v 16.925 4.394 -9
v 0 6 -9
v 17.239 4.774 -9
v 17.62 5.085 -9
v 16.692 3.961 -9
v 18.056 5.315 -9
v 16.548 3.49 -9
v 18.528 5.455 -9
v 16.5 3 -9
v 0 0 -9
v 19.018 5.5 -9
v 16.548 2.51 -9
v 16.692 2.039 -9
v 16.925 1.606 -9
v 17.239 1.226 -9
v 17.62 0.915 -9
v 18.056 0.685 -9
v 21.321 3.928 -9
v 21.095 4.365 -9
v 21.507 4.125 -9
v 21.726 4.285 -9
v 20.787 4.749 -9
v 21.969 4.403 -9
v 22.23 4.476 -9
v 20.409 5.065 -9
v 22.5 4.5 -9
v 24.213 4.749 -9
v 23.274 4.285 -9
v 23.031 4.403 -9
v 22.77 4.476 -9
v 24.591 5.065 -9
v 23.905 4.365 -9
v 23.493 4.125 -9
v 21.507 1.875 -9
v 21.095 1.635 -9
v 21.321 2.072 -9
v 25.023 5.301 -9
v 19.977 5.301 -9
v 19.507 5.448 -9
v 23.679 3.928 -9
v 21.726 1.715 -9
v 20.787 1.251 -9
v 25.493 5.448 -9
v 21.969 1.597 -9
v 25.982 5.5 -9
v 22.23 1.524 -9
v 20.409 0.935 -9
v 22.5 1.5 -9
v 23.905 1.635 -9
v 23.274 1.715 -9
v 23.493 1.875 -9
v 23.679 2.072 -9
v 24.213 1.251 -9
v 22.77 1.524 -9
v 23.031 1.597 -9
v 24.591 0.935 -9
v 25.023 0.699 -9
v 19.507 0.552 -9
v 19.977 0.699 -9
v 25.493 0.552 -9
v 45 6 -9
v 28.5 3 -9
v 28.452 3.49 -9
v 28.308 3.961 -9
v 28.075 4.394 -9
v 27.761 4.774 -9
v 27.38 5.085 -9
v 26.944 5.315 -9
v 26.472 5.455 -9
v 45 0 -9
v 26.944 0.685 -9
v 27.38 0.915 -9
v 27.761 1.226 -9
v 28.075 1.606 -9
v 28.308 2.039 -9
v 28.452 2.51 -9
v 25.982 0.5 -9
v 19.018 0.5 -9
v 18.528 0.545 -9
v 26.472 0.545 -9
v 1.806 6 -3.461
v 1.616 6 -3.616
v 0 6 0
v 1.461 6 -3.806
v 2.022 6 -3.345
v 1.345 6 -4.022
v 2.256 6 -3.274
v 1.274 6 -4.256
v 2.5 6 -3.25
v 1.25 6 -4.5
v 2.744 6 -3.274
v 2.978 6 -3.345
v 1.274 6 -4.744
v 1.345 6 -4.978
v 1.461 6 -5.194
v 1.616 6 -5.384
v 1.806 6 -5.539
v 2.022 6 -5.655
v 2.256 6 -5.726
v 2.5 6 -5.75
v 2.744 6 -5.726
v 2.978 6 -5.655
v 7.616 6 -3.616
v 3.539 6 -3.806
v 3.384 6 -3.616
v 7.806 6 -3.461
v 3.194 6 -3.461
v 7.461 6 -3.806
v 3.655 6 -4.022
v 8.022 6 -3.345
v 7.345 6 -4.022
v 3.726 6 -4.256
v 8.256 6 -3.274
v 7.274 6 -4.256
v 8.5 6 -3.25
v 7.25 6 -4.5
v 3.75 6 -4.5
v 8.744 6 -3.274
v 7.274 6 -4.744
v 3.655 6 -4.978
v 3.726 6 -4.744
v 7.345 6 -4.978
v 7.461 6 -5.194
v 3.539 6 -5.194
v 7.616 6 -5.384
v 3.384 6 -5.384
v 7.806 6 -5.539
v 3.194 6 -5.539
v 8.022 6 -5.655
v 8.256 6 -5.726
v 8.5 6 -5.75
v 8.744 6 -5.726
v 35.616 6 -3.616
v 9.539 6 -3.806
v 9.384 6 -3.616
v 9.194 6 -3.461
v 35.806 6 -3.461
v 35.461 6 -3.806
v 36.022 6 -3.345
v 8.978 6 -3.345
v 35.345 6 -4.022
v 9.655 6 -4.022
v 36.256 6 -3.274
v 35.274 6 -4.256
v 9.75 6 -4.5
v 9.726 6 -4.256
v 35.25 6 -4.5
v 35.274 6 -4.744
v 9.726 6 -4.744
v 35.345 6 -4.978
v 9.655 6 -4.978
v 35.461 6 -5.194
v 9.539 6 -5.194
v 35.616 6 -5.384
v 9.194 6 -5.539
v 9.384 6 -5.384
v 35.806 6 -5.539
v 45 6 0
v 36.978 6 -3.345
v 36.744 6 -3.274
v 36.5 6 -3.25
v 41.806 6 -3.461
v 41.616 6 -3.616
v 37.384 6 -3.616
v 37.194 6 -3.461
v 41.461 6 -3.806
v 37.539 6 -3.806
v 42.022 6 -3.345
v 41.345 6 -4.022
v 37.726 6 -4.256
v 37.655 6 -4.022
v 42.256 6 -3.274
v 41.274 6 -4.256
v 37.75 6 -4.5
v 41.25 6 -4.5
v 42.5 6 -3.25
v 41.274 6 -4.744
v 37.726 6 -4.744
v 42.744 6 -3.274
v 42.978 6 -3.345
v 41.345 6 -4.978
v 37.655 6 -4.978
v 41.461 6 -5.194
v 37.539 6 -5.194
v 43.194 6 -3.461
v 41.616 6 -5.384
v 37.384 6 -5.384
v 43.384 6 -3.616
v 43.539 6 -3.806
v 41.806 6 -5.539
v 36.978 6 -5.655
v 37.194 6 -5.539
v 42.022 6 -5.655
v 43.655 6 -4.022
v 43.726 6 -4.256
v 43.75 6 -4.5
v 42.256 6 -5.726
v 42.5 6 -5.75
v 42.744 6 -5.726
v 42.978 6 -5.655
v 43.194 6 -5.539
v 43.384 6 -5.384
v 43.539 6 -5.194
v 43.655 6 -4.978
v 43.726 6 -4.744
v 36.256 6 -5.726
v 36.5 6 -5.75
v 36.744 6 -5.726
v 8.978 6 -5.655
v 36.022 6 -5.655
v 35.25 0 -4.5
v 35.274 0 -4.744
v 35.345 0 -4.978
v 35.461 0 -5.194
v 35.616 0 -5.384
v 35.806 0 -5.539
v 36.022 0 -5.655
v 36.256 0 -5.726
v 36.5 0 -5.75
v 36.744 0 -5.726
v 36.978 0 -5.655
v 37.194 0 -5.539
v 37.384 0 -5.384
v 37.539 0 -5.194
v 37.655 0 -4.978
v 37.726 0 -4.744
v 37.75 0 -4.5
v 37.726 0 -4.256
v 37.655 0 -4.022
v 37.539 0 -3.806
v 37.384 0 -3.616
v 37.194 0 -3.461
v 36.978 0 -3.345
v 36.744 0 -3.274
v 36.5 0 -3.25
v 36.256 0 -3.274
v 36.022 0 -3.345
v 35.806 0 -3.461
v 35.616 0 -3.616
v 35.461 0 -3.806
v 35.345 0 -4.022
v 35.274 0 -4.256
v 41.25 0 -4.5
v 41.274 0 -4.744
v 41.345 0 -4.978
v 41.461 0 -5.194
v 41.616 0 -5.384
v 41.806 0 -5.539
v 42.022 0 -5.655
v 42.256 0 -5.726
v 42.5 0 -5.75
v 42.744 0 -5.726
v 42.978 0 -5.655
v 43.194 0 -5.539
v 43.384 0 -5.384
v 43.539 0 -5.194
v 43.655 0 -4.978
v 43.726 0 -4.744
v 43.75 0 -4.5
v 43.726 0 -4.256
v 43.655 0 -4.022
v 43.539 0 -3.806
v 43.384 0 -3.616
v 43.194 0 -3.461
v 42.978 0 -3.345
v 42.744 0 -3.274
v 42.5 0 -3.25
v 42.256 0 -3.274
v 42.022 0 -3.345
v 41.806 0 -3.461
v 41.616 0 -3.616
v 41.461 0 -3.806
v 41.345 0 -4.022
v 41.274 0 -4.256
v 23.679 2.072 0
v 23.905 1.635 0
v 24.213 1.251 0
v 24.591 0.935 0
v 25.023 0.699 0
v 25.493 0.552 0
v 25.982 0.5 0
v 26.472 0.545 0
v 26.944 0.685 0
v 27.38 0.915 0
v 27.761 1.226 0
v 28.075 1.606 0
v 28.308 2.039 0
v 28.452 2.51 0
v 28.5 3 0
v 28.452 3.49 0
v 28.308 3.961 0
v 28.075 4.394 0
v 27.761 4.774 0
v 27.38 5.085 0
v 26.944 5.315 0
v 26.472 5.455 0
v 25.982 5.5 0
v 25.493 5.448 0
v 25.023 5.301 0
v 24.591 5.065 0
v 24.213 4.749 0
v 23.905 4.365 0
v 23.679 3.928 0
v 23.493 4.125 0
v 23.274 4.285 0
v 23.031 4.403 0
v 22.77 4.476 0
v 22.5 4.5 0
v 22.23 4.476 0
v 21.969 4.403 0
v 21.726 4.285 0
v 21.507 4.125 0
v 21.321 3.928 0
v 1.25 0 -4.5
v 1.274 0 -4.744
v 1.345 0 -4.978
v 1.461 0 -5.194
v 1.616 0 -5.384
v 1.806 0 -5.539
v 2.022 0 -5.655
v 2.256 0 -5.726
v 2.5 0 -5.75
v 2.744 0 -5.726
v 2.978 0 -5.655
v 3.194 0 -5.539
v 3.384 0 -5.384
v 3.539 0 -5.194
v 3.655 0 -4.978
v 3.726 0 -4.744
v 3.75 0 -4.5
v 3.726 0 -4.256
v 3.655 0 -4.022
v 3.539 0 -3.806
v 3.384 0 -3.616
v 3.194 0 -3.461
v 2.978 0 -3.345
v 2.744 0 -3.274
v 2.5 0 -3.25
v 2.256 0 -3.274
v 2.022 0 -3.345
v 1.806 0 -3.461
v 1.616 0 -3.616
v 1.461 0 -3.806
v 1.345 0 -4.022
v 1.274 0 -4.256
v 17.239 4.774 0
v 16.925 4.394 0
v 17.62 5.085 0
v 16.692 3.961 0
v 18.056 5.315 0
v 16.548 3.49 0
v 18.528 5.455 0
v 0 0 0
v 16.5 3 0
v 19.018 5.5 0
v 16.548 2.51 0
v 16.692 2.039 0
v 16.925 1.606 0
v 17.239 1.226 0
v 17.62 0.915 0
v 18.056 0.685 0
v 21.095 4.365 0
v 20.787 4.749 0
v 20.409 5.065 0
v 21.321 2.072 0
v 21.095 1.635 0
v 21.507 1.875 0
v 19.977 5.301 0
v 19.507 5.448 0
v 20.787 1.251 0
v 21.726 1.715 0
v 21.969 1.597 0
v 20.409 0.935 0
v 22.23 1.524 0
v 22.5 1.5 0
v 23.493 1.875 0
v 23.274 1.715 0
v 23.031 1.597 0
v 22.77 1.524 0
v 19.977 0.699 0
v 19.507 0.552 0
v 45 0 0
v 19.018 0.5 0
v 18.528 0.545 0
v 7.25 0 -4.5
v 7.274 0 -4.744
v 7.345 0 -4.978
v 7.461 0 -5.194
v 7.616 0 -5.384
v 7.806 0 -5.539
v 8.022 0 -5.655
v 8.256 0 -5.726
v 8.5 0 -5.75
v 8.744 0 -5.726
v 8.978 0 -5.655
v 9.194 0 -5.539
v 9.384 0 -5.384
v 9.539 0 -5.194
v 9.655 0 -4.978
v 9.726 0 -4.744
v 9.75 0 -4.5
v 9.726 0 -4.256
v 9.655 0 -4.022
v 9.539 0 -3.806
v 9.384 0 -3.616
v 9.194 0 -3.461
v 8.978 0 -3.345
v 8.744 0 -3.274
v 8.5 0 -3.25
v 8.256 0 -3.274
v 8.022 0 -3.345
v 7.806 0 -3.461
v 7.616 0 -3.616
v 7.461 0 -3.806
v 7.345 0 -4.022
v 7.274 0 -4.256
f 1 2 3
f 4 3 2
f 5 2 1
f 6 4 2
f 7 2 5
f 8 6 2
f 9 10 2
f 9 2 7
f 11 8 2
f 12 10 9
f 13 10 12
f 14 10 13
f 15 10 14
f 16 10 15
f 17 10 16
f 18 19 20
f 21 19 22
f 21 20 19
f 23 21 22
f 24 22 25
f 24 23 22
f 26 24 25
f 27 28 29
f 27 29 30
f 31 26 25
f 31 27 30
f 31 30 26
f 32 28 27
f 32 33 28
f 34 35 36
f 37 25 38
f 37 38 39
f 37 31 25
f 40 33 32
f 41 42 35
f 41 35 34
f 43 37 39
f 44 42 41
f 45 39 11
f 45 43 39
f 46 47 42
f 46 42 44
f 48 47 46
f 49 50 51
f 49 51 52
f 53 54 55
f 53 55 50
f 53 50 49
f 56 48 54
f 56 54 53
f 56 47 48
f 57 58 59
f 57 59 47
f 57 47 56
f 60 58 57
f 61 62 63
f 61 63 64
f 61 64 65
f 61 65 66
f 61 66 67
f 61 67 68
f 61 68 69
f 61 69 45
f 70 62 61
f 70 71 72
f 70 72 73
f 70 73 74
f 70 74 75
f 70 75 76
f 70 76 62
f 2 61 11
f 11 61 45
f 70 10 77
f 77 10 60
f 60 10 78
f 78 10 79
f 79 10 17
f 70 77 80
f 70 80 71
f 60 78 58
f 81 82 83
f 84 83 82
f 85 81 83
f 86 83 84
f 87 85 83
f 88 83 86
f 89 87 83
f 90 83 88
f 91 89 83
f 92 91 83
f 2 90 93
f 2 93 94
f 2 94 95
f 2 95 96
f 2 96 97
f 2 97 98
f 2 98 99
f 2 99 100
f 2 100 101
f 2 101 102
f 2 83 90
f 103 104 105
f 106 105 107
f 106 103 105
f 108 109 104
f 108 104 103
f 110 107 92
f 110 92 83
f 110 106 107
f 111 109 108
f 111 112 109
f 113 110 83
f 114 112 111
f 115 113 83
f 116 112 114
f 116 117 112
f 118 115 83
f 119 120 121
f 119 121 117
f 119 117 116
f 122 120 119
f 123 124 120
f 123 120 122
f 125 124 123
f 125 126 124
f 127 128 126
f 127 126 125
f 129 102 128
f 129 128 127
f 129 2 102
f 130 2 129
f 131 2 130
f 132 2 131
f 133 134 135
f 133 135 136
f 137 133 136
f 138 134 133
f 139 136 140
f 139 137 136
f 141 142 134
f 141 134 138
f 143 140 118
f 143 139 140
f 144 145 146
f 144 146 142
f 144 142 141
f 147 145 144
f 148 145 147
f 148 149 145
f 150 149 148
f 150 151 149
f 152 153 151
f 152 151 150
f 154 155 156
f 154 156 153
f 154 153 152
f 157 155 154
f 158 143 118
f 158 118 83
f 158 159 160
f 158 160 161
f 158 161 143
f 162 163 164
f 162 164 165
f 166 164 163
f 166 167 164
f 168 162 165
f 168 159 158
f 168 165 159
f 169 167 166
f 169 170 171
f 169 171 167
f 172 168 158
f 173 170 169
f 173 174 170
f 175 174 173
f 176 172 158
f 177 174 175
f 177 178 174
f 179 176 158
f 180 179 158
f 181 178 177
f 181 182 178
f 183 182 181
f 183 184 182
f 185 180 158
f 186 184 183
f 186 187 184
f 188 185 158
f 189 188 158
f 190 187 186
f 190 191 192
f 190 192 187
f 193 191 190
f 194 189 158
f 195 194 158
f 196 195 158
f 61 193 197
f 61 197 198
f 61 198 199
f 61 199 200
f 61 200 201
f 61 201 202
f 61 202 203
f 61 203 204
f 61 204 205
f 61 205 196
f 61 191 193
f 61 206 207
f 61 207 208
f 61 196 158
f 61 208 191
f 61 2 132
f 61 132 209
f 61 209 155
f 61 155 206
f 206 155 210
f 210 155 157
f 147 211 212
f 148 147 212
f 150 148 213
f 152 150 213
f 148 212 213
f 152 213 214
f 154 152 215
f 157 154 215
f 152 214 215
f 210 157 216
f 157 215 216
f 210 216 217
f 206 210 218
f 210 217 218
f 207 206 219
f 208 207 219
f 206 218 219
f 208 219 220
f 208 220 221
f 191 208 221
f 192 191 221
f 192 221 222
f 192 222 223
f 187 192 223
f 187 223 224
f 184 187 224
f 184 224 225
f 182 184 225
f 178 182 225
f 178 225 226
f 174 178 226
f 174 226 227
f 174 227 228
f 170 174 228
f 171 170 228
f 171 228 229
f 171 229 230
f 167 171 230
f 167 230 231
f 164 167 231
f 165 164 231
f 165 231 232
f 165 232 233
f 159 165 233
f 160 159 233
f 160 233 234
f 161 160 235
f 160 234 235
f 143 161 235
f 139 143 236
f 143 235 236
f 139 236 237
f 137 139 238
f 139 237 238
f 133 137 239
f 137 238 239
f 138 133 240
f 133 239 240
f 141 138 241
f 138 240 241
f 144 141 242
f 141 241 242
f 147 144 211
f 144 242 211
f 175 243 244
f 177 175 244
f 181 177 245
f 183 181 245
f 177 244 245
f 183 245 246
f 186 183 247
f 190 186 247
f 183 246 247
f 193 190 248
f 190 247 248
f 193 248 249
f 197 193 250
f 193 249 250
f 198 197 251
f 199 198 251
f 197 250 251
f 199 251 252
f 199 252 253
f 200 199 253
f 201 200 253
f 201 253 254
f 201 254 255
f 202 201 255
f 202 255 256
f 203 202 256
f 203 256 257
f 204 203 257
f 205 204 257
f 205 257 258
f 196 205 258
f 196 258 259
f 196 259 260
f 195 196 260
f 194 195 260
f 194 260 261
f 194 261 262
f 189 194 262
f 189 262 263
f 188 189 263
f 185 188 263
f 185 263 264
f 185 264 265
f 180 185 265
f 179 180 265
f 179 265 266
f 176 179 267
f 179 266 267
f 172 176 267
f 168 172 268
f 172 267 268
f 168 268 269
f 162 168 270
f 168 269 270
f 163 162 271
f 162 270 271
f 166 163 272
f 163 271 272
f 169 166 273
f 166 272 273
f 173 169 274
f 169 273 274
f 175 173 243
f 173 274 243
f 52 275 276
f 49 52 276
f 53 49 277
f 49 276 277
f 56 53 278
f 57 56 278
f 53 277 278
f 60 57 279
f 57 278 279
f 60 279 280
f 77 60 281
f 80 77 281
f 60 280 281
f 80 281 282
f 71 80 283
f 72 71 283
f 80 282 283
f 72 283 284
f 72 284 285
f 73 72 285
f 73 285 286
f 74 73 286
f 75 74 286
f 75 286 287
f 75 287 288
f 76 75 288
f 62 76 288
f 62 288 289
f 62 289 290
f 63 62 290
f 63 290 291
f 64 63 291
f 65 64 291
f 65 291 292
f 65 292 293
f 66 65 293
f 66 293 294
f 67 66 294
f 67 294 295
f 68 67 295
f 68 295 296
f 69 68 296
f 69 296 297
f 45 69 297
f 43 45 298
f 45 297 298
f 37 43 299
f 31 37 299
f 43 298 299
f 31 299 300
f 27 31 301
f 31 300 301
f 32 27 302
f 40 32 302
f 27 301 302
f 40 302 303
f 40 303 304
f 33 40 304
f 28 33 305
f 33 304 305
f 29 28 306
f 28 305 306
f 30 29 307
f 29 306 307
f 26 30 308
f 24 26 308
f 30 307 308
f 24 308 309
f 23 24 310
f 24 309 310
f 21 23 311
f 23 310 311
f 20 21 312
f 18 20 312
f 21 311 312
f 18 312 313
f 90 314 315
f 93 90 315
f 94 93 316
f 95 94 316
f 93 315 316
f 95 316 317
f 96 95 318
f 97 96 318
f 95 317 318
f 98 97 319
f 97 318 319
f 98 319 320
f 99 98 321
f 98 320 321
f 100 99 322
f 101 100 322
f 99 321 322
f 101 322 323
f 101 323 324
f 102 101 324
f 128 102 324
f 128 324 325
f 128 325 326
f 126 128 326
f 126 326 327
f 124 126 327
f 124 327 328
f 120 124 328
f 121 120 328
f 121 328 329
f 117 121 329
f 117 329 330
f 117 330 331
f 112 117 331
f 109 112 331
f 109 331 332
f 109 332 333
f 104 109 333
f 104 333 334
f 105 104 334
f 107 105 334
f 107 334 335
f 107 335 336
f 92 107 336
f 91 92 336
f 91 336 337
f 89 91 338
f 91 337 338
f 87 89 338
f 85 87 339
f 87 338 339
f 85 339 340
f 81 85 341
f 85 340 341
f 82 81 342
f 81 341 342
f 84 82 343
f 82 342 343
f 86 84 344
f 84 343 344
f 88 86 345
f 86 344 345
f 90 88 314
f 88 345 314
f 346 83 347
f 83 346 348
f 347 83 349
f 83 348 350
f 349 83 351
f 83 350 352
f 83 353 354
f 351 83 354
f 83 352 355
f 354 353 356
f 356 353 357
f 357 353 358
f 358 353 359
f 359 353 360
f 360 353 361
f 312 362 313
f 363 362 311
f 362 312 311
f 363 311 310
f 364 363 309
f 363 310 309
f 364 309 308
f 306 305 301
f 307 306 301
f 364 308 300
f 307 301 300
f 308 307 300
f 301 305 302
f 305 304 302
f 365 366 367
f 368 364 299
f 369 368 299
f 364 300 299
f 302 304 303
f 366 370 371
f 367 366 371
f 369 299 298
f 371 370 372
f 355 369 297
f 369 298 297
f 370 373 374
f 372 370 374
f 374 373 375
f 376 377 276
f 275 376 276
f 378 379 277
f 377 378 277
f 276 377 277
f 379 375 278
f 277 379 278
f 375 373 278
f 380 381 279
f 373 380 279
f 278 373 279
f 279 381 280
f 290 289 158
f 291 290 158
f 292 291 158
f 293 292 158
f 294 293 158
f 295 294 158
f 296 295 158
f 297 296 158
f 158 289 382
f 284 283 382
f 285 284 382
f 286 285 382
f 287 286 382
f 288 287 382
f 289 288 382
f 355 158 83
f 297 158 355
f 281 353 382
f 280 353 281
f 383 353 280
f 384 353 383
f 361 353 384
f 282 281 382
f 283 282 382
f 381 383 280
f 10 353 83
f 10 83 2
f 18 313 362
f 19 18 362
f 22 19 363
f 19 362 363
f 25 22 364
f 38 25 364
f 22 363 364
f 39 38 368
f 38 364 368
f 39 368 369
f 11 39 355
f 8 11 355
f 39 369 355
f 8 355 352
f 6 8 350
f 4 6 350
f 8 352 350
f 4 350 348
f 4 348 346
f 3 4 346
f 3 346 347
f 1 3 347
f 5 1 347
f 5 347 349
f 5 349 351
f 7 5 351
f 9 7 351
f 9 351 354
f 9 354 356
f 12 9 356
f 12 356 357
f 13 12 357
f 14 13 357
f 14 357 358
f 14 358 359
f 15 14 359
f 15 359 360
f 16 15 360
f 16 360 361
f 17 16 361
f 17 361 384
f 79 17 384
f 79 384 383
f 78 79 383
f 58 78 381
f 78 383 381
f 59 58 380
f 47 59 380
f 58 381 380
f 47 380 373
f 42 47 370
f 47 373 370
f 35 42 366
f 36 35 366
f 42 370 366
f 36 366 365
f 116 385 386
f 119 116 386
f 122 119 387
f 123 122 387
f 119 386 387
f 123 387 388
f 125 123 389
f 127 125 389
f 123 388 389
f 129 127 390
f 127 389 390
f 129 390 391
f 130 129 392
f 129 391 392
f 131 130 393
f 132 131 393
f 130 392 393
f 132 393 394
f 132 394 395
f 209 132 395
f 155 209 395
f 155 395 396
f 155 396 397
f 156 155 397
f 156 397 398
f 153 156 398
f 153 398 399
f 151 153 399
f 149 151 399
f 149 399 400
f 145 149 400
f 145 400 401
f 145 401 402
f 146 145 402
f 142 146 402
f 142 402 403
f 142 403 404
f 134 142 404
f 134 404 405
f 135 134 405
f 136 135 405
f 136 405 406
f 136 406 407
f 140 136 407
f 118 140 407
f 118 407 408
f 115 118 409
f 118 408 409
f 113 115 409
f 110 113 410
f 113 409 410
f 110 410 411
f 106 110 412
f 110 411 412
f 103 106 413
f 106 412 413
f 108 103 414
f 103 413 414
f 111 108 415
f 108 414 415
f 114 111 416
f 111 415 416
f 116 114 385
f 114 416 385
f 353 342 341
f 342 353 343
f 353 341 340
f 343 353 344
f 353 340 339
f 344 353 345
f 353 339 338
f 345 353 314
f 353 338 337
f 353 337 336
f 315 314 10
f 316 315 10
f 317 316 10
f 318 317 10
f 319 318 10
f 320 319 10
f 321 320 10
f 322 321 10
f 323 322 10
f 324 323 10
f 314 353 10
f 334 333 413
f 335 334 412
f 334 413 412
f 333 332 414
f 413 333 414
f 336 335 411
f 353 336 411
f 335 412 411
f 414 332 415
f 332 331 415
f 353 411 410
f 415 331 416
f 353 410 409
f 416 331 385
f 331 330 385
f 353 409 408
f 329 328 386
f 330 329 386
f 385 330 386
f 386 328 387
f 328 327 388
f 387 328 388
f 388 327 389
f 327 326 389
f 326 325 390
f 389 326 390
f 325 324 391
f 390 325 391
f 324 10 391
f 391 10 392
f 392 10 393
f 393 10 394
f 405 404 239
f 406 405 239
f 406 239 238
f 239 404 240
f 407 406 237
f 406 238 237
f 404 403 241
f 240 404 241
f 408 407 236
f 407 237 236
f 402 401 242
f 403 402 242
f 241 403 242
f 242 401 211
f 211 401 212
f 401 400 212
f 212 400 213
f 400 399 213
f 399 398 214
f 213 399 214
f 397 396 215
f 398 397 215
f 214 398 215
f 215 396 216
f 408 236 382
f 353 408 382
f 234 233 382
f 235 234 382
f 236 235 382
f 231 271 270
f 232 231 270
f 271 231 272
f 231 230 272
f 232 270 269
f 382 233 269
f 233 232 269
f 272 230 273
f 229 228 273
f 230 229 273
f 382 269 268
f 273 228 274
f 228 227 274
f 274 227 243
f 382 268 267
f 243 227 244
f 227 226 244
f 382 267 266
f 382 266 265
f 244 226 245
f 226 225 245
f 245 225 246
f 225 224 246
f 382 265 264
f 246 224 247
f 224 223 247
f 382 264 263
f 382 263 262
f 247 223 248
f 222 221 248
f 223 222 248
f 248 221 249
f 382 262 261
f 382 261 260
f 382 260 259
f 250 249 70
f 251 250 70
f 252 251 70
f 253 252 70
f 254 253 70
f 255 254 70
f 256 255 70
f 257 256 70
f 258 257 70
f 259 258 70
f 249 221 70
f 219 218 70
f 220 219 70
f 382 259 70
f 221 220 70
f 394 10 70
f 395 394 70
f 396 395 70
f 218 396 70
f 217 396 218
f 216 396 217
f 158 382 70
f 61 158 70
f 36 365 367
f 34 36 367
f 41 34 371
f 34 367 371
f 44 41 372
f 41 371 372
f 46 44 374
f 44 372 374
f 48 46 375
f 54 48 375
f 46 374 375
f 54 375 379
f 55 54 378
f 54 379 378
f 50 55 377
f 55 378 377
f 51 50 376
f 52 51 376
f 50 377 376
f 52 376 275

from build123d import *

# Parameters (mm, degrees)
SKETCH_1_W          = 45
SKETCH_1_H          = 9
EXTRUDE_1_DEPTH     = 6
HOLE_WIZARD_M3_1_D  = 2.5
CUT_EXTRUDE_1_DEPTH = 47.281745862


with BuildPart() as part:
    # 草图1 → 凸台-拉伸1 (new body)
    with BuildSketch(Plane(origin=(0, 0, 0), x_dir=(1, 0, 0), z_dir=(0, 1, 0))):
        with Locations((22.5, 4.5)):
            Rectangle(SKETCH_1_W, SKETCH_1_H)
    extrude(amount=EXTRUDE_1_DEPTH)

    # M3 螺纹孔1 (through all)
    with Locations(Plane(origin=(0, 6, 0), x_dir=(1, 0, 0), z_dir=(0, 1, 0))):
        with Locations((2.5, 4.5), (8.5, 4.5), (36.5, 4.5), (42.5, 4.5)):
            Hole(HOLE_WIZARD_M3_1_D / 2)

    # 草图4 → 切除-拉伸1 (cut, through all)
    with BuildSketch(Plane.XY):
        with BuildLine():
            ThreePointArc((21.321428571, 2.072115639), (22.5, 1.5), (23.678571429, 2.072115639))
            ThreePointArc((23.678571429, 2.072115639), (28.5, 3), (23.678571429, 3.927884361))
            ThreePointArc((23.678571429, 3.927884361), (22.5, 4.5), (21.321428571, 3.927884361))
            ThreePointArc((21.321428571, 3.927884361), (16.5, 3), (21.321428571, 2.072115639))
        make_face()
    extrude(amount=-CUT_EXTRUDE_1_DEPTH, mode=Mode.SUBTRACT)


solid = part.part
